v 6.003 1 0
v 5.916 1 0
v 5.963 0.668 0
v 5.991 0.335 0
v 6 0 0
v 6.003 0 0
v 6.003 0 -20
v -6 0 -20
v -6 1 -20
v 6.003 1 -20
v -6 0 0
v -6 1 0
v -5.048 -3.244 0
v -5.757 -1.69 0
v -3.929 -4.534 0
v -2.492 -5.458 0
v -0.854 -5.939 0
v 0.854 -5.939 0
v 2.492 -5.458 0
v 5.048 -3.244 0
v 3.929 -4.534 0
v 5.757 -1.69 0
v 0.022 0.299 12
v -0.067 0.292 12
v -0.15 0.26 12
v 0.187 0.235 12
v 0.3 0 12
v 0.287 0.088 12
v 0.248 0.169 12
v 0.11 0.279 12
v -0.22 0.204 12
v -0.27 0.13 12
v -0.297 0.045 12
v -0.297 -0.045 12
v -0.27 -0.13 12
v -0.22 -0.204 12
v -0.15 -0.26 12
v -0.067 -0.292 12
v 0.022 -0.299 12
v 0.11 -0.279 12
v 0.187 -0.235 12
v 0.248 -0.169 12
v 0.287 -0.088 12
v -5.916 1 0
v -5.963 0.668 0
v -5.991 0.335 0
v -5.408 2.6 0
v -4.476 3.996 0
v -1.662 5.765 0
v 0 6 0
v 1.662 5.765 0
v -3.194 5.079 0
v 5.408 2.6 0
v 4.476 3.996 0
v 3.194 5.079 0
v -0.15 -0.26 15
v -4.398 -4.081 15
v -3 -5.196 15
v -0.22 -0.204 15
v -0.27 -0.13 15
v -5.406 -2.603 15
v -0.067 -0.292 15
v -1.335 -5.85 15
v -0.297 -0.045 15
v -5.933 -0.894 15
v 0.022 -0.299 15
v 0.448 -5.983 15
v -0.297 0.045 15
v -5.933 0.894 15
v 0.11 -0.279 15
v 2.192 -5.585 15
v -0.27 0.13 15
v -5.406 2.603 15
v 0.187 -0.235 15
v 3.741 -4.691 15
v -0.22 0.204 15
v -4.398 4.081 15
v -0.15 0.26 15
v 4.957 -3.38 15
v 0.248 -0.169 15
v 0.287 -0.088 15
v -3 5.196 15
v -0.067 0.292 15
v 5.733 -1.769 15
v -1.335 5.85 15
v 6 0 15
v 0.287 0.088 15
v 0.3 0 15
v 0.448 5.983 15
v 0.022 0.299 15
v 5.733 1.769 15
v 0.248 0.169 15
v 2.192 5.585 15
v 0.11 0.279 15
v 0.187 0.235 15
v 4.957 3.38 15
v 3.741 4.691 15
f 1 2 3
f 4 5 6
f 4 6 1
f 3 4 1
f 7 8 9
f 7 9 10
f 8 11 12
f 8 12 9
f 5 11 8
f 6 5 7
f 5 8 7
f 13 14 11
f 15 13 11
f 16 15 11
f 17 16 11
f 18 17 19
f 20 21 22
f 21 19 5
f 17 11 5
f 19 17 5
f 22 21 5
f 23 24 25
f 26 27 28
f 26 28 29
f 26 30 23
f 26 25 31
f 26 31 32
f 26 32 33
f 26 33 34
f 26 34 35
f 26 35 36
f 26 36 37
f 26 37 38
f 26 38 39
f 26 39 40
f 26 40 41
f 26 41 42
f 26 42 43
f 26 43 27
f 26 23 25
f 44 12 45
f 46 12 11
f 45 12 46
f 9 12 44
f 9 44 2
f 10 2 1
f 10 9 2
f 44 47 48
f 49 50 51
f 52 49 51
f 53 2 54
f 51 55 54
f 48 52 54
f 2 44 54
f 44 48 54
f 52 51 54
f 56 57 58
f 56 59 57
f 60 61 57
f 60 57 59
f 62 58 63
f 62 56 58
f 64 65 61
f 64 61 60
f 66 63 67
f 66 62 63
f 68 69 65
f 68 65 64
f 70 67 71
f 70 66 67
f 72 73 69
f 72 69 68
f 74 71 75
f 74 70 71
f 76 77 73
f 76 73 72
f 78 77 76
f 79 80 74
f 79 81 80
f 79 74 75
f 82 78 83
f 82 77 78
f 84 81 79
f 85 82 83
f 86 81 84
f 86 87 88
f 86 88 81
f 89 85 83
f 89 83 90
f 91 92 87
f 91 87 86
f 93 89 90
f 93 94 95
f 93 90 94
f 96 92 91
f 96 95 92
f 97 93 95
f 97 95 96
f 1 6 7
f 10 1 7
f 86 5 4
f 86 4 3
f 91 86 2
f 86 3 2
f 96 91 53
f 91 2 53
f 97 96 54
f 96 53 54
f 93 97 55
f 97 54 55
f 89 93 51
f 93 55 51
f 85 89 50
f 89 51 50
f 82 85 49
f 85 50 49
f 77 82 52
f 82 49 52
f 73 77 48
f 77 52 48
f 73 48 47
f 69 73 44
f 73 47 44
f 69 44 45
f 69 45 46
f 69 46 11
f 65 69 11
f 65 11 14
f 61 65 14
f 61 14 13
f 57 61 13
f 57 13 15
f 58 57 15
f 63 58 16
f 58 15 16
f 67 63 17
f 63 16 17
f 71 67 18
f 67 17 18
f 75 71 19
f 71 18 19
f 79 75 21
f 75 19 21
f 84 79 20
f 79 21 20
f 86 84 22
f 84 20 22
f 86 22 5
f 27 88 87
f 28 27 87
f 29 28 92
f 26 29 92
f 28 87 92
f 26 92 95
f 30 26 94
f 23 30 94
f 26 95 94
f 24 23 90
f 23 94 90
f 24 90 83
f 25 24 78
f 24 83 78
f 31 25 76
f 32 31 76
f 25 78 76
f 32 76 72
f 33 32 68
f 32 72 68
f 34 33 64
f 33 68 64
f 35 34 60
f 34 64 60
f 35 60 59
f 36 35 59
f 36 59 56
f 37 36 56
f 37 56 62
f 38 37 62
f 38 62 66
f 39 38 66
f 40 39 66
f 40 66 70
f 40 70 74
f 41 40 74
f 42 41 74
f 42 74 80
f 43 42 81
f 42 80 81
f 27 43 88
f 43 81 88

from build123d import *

# Parameters (mm, degrees)
ESQUISSE1_R             = 6
BOSS_EXTRU_1_DEPTH      = 15
ESQUISSE2_R             = 0.3
ENL_V_MAT_EXTRU_1_DEPTH = 3
ESQUISSE3_W             = 12.003336486
ESQUISSE3_H             = 20
BOSS_EXTRU_2_DEPTH      = 1


with BuildPart() as part:
    # Esquisse1 → Boss.-Extru.1 (new body)
    with BuildSketch(Plane.XY):
        Circle(ESQUISSE1_R)
    extrude(amount=BOSS_EXTRU_1_DEPTH)

    # Esquisse2 → Enlèv. mat.-Extru.1 (cut)
    with BuildSketch(Plane.XY.offset(15)):
        Circle(ESQUISSE2_R)
    extrude(amount=-ENL_V_MAT_EXTRU_1_DEPTH, mode=Mode.SUBTRACT)

    # Esquisse3 → Boss.-Extru.2 (add)
    with BuildSketch(Plane(origin=(0, 0, 0), x_dir=(1, 0, 0), z_dir=(0, 1, 0))):
        with Locations((0.001668243, 10)):
            Rectangle(ESQUISSE3_W, ESQUISSE3_H)
    extrude(amount=BOSS_EXTRU_2_DEPTH)


solid = part.part
